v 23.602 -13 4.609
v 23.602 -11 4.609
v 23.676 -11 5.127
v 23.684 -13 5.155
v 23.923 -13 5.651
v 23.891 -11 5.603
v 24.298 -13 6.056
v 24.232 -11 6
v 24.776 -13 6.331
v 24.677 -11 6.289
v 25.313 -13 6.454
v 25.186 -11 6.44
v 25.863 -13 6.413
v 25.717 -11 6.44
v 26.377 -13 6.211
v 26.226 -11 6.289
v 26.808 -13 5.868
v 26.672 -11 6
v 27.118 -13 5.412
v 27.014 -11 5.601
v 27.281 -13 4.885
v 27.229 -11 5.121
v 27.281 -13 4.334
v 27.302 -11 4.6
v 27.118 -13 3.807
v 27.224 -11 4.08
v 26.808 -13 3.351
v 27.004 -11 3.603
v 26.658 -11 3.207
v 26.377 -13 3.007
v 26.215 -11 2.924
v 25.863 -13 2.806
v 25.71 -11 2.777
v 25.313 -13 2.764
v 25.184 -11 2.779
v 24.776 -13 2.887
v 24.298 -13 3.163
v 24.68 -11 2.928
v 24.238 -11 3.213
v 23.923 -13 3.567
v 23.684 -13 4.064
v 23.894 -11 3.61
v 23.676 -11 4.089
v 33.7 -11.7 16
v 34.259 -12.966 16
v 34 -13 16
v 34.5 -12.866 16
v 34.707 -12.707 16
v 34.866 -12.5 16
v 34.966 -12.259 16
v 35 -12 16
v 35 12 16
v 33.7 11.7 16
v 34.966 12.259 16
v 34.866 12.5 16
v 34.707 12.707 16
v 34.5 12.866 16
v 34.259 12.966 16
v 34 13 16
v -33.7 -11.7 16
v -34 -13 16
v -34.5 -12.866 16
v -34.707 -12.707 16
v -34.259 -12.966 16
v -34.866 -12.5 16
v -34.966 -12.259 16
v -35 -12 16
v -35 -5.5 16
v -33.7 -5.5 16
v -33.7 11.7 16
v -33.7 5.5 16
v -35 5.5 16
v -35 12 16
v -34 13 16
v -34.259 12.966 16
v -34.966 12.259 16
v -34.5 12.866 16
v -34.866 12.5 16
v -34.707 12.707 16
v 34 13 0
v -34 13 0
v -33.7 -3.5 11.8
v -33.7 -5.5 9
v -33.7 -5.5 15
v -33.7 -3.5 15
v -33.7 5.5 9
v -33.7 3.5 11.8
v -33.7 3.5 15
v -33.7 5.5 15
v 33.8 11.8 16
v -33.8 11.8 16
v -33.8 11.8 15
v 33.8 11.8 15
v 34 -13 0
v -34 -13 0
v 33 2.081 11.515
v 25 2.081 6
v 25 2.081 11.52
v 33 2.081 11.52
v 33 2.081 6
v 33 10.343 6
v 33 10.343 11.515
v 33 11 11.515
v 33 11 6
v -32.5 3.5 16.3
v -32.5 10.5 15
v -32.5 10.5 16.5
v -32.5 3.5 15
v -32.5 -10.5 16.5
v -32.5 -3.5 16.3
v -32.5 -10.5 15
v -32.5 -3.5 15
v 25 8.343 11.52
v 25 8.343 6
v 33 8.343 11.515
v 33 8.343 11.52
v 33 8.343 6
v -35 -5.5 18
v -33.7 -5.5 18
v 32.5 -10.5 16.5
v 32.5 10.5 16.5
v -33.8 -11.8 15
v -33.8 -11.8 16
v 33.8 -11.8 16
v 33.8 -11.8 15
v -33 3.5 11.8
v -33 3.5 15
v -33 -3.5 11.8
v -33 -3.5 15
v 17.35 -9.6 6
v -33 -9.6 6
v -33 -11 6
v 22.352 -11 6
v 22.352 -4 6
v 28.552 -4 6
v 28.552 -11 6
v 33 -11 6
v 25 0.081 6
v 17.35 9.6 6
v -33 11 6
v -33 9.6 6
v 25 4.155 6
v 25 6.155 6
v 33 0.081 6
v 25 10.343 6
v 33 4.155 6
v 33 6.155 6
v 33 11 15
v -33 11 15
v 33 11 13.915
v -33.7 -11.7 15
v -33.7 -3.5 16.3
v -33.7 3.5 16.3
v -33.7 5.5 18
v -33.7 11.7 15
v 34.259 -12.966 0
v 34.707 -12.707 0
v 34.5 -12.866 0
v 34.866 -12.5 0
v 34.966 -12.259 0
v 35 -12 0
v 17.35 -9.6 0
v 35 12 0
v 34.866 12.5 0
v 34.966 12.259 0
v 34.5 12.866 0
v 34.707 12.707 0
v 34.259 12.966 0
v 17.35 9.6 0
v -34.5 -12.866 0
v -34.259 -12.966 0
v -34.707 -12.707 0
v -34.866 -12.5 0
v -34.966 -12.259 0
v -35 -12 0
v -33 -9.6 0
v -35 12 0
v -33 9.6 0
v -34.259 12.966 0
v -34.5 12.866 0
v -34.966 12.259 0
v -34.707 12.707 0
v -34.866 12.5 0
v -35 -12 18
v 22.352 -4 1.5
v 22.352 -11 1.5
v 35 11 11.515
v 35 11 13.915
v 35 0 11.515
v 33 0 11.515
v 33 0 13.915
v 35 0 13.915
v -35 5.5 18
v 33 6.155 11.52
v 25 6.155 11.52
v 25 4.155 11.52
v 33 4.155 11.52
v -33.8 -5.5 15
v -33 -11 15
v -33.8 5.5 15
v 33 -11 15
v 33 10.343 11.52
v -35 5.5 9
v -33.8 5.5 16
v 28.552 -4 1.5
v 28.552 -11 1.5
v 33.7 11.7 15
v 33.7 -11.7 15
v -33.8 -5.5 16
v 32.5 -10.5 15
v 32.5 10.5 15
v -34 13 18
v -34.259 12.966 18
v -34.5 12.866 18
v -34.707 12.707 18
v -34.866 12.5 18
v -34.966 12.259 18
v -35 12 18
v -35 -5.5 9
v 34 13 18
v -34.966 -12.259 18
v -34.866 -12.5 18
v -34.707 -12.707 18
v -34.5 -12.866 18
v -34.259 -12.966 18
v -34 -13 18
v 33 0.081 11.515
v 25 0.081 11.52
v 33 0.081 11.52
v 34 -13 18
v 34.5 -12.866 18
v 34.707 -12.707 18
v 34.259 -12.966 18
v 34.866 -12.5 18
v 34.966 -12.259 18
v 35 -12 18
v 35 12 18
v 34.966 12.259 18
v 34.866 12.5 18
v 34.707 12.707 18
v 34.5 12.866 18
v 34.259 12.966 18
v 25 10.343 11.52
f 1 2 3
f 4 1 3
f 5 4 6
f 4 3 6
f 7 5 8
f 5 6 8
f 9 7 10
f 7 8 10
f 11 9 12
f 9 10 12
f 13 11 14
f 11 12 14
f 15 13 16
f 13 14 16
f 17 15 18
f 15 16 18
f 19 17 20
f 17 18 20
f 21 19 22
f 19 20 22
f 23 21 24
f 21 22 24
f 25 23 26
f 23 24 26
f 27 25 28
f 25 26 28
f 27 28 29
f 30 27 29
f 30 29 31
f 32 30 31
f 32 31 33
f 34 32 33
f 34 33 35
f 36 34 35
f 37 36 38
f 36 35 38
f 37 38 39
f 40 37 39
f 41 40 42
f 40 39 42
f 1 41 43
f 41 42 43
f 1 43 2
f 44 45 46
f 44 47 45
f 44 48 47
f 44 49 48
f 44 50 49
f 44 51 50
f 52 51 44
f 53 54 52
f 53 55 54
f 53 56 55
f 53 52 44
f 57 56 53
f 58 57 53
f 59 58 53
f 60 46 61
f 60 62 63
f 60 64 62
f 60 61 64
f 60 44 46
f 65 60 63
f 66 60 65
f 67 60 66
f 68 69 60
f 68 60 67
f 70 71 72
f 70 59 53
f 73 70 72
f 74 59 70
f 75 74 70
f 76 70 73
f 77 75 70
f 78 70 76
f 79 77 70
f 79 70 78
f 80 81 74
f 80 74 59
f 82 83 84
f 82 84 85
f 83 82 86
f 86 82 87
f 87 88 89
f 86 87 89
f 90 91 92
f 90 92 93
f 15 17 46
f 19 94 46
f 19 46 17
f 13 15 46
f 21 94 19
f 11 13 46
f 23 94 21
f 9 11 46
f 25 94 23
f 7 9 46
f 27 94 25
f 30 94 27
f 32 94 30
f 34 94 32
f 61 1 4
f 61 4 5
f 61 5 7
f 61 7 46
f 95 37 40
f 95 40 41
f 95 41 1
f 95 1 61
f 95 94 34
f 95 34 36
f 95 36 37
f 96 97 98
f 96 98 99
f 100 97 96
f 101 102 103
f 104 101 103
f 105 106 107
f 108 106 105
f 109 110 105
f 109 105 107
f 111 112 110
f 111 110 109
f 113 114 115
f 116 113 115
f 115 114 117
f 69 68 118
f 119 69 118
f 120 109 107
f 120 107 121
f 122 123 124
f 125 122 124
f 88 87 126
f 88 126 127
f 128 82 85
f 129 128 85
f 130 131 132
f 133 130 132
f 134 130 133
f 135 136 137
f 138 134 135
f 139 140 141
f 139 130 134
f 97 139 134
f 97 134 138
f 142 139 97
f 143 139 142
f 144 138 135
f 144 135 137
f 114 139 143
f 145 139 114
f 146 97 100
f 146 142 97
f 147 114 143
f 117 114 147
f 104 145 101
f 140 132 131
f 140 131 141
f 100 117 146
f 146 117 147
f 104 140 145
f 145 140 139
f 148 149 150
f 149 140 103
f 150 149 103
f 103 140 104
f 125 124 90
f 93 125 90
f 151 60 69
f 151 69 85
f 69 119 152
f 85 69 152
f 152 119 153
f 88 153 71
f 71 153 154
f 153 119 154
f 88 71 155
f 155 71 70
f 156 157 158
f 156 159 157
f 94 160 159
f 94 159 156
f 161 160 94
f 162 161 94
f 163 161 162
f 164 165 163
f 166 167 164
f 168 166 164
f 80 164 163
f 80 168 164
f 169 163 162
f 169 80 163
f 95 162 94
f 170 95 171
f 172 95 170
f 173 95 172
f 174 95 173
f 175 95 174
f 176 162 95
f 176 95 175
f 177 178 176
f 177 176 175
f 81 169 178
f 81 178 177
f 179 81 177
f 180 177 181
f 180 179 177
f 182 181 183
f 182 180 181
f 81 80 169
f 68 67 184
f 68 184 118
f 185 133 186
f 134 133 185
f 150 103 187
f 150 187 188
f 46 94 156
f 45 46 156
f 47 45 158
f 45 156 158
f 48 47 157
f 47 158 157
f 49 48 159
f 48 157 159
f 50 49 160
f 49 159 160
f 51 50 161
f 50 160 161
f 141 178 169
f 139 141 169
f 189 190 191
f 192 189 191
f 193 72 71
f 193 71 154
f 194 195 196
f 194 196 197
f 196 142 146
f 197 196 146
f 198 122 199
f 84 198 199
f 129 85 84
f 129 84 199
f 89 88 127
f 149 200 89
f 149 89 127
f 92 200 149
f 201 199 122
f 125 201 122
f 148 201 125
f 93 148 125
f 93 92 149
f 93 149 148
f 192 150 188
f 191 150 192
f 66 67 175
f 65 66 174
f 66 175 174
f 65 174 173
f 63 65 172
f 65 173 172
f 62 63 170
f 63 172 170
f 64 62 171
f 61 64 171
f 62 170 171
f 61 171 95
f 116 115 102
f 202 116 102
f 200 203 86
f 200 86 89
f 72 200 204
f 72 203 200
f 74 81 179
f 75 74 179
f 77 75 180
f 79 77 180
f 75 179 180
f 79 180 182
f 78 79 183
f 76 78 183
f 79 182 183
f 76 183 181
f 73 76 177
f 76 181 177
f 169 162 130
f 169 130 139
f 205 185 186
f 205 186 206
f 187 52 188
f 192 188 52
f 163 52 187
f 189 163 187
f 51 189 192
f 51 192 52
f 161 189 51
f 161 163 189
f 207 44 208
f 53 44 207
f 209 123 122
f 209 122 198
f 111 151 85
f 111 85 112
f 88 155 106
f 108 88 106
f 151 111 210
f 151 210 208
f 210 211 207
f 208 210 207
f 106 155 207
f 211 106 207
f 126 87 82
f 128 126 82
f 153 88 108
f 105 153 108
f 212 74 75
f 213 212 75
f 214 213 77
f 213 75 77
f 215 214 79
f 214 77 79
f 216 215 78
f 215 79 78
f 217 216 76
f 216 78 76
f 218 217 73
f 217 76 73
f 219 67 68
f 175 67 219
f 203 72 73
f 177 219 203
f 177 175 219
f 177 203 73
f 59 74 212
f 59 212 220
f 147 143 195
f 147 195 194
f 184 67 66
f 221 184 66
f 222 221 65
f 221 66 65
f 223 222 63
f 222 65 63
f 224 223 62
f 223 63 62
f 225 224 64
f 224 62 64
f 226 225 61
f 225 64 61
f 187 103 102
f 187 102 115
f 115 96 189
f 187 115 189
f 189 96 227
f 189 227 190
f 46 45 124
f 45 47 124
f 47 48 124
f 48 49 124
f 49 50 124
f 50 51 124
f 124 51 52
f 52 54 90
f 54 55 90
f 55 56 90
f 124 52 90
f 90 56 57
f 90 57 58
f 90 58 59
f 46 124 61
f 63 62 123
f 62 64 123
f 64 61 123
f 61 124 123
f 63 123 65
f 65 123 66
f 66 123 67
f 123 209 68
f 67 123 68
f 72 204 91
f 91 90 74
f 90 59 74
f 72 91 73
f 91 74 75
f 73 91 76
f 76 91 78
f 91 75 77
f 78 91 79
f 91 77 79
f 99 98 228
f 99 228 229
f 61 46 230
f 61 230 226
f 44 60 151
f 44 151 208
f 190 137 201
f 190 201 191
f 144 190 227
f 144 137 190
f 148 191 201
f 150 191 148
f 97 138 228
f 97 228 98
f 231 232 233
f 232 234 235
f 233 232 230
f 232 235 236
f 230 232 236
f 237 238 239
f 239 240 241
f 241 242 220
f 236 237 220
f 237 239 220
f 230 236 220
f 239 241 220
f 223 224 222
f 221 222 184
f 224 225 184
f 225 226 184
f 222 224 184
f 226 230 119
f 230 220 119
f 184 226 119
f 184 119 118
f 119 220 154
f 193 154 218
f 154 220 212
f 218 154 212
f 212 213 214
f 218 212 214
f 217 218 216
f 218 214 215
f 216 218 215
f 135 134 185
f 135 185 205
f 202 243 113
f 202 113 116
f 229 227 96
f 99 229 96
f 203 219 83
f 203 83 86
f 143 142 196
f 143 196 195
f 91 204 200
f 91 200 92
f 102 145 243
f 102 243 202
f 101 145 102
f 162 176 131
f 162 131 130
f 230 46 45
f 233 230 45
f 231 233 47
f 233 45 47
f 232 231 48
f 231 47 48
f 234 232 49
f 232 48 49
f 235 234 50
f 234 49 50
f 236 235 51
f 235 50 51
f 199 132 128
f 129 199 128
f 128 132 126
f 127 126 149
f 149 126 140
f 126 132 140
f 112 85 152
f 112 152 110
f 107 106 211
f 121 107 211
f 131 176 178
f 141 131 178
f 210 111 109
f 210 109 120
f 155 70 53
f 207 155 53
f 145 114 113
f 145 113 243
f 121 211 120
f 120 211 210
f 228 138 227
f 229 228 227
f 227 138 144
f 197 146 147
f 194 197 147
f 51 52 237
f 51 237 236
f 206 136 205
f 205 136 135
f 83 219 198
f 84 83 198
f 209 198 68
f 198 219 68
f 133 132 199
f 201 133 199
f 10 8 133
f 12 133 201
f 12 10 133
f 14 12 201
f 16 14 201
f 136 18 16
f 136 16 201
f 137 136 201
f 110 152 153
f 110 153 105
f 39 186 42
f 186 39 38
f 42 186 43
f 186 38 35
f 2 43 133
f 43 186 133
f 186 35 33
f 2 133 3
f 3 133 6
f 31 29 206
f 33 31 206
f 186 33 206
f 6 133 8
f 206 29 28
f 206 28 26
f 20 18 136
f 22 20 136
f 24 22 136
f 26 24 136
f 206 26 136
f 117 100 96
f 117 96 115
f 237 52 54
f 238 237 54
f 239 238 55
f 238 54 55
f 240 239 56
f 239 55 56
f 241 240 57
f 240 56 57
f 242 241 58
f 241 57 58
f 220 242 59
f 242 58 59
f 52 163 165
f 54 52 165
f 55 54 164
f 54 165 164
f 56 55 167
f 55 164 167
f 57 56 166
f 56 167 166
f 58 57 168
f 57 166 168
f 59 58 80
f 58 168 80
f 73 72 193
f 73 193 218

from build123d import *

# Parameters (mm, degrees)
PAD_DEPTH       = 16
SKETCH001_W     = 66
SKETCH001_H     = 22
POCKET_DEPTH    = 9
SKETCH002_W     = 50.35
SKETCH002_H     = 19.2
POCKET001_DEPTH = 6
SKETCH003_W     = 11
SKETCH003_H     = 8.6
POCKET002_DEPTH = 1.3
SKETCH004_W     = 7
SKETCH004_H     = 3.2
POCKET003_DEPTH = 1
SKETCH007_W     = 67.6
SKETCH007_H     = 23.6
POCKET004_DEPTH = 1
SKETCH011_W     = 6.2
SKETCH011_H     = 7
POCKET008_DEPTH = 4.5
SKETCH012_R     = 1.85
POCKET009_DEPTH = 2.1
SKETCH013_W     = 11
SKETCH013_H     = 2.4
POCKET010_DEPTH = 2.1
SKETCH014_W     = 8
SKETCH014_H     = 2
PAD003_DEPTH    = 5.52
PAD001_DEPTH    = 2
SKETCH006_W     = 67.4
SKETCH006_H     = 23.4
PAD002_DEPTH    = 1
SKETCH008_W     = 10.999998
SKETCH008_H     = 3.000001
POCKET005_DEPTH = 1.3
SKETCH009_W     = 10
SKETCH009_H     = 7
POCKET006_DEPTH = 1.3
SKETCH010_W     = 65
SKETCH010_H     = 21
POCKET007_DEPTH = 1.5


with BuildPart() as body:
    # Sketch → Pad (new body)
    with BuildSketch(Plane.XY):
        with BuildLine():
            Line((-33.9999998076, 12.9999934698), (34.0000001924, 12.9999934698))
            ThreePointArc((35.0000001924, 11.9999934698), (34.7071069735, 12.707100251), (34.0000001924, 12.9999934698))
            Line((35.0000001924, 11.9999934698), (35.0000001924, -12.0000065302))
            ThreePointArc((34.0000001924, -13.0000065302), (34.7071069735, -12.7071133114), (35.0000001924, -12.0000065302))
            Line((34.0000001924, -13.0000065302), (-33.9999998076, -13.0000065302))
            ThreePointArc((-34.9999998076, -12.0000065302), (-34.7071065888, -12.7071133114), (-33.9999998076, -13.0000065302))
            Line((-34.9999998076, -12.0000065302), (-34.9999998076, 11.9999934698))
            ThreePointArc((-33.9999998076, 12.9999934698), (-34.7071065888, 12.707100251), (-34.9999998076, 11.9999934698))
        make_face()
    extrude(amount=PAD_DEPTH)

    # Sketch001 → Pocket (cut)
    with BuildSketch(Plane.XY.offset(6)):
        with Locations((-0.000412, 0)):
            Rectangle(SKETCH001_W, SKETCH001_H)
    extrude(amount=POCKET_DEPTH, mode=Mode.SUBTRACT)

    # Sketch002 → Pocket001 (cut)
    with BuildSketch(Plane.XY):
        with Locations((-7.8254111247, 2.875e-07)):
            Rectangle(SKETCH002_W, SKETCH002_H)
    extrude(amount=POCKET001_DEPTH, mode=Mode.SUBTRACT)

    # Sketch003 → Pocket002 (cut)
    with BuildSketch(Plane.YZ.offset(-35)):
        with Locations((-3.237e-07, 13.3)):
            Rectangle(SKETCH003_W, SKETCH003_H)
    extrude(amount=POCKET002_DEPTH, mode=Mode.SUBTRACT)

    # Sketch004 → Pocket003 (cut)
    with BuildSketch(Plane(origin=(-33.7, 0, 0), x_dir=(0, -1, 0), z_dir=(-1, 0, 0))):
        with Locations((2.875e-07, 13.4)):
            Rectangle(SKETCH004_W, SKETCH004_H)
    extrude(amount=-POCKET003_DEPTH, mode=Mode.SUBTRACT)

    # Sketch007 (on Face5 of Pocket003) → Pocket004 (cut)
    with BuildSketch(Plane.XY.offset(16)):
        with Locations((4.937e-07, 5.063e-07)):
            Rectangle(SKETCH007_W, SKETCH007_H)
    extrude(amount=-POCKET004_DEPTH, mode=Mode.SUBTRACT)

    # Sketch011 (on Face23 of Pocket004) → Pocket008 (cut)
    with BuildSketch(Plane.XY.offset(6)):
        with Locations((25.451729103, -7.5000004246)):
            Rectangle(SKETCH011_W, SKETCH011_H)
    extrude(amount=-POCKET008_DEPTH, mode=Mode.SUBTRACT)

    # Sketch012 (on Face36 of Pocket008) → Pocket009 (cut)
    with BuildSketch(Plane(origin=(0, -11.0000004246, 0), x_dir=(-1, 0, 0), z_dir=(0, 1, 0))):
        with Locations((-25.451651, 4.609303)):
            Circle(SKETCH012_R)
    extrude(amount=-POCKET009_DEPTH, mode=Mode.SUBTRACT)

    # Sketch013 (on Face30 of Pocket009) → Pocket010 (cut)
    with BuildSketch(Plane(origin=(32.999588, 0, 0), x_dir=(0, -1, 0), z_dir=(-1, 0, 0))):
        with Locations((-5.4999997125, 12.7152388155)):
            Rectangle(SKETCH013_W, SKETCH013_H)
    extrude(amount=-POCKET010_DEPTH, mode=Mode.SUBTRACT)

    # Sketch014 (on Face28 of Pocket010) → Pad003 (join)
    with BuildSketch(Plane.XY.offset(6)):
        with Locations((28.9995880772, 9.3428830657)):
            Rectangle(SKETCH014_W, SKETCH014_H)
        with Locations((28.999588, 1.0813236831)):
            Rectangle(SKETCH014_W, SKETCH014_H)
        with Locations((28.999587609, 5.1552923249)):
            Rectangle(SKETCH014_W, SKETCH014_H)
    extrude(amount=PAD003_DEPTH)


with BuildPart() as cap:
    # Sketch005 → Pad001 (new body)
    with BuildSketch(Plane.XY.offset(16)):
        with BuildLine():
            Line((-34.0000002031, 12.9999934769), (33.9999997969, 12.9999934769))
            ThreePointArc((34.9999997969, 11.9999934769), (34.7071065781, 12.7071002581), (33.9999997969, 12.9999934769))
            Line((34.9999997969, 11.9999934769), (34.9999997969, -12.0000065231))
            ThreePointArc((33.9999997969, -13.0000065231), (34.7071065781, -12.7071133043), (34.9999997969, -12.0000065231))
            Line((33.9999997969, -13.0000065231), (-34.0000002031, -13.0000065231))
            ThreePointArc((-35.0000002031, -12.0000065231), (-34.7071069843, -12.7071133043), (-34.0000002031, -13.0000065231))
            Line((-35.0000002031, -12.0000065231), (-35.0000002031, 11.9999934769))
            ThreePointArc((-34.0000002031, 12.9999934769), (-34.7071069843, 12.7071002581), (-35.0000002031, 11.9999934769))
        make_face()
    extrude(amount=PAD001_DEPTH)

    # Sketch006 → Pad002 (join)
    with BuildSketch(Plane.XY.offset(16)):
        with Locations((-2.17e-08, 1.7722e-06)):
            Rectangle(SKETCH006_W, SKETCH006_H)
    extrude(amount=-PAD002_DEPTH)

    # Sketch008 → Pocket005 (cut)
    with BuildSketch(Plane.YZ.offset(-35)):
        with Locations((6e-06, 16.5000055)):
            Rectangle(SKETCH008_W, SKETCH008_H)
    extrude(amount=POCKET005_DEPTH, mode=Mode.SUBTRACT)

    # Sketch009 (on Face20 of Pocket005) → Pocket006 (cut)
    with BuildSketch(Plane(origin=(0, 0, 15), x_dir=(1, 0, 0), z_dir=(0, 0, -1))):
        with Locations((-28.7000033219, 1.031e-07)):
            Rectangle(SKETCH009_W, SKETCH009_H)
    extrude(amount=-POCKET006_DEPTH, mode=Mode.SUBTRACT)

    # Sketch010 (on Face22 of Pocket006) → Pocket007 (cut)
    with BuildSketch(Plane(origin=(0, 0, 15), x_dir=(1, 0, 0), z_dir=(0, 0, -1))):
        with Locations((-4.249e-07, -2.875e-07)):
            Rectangle(SKETCH010_W, SKETCH010_H)
    extrude(amount=-POCKET007_DEPTH, mode=Mode.SUBTRACT)


solid = Compound([body.part, cap.part])
